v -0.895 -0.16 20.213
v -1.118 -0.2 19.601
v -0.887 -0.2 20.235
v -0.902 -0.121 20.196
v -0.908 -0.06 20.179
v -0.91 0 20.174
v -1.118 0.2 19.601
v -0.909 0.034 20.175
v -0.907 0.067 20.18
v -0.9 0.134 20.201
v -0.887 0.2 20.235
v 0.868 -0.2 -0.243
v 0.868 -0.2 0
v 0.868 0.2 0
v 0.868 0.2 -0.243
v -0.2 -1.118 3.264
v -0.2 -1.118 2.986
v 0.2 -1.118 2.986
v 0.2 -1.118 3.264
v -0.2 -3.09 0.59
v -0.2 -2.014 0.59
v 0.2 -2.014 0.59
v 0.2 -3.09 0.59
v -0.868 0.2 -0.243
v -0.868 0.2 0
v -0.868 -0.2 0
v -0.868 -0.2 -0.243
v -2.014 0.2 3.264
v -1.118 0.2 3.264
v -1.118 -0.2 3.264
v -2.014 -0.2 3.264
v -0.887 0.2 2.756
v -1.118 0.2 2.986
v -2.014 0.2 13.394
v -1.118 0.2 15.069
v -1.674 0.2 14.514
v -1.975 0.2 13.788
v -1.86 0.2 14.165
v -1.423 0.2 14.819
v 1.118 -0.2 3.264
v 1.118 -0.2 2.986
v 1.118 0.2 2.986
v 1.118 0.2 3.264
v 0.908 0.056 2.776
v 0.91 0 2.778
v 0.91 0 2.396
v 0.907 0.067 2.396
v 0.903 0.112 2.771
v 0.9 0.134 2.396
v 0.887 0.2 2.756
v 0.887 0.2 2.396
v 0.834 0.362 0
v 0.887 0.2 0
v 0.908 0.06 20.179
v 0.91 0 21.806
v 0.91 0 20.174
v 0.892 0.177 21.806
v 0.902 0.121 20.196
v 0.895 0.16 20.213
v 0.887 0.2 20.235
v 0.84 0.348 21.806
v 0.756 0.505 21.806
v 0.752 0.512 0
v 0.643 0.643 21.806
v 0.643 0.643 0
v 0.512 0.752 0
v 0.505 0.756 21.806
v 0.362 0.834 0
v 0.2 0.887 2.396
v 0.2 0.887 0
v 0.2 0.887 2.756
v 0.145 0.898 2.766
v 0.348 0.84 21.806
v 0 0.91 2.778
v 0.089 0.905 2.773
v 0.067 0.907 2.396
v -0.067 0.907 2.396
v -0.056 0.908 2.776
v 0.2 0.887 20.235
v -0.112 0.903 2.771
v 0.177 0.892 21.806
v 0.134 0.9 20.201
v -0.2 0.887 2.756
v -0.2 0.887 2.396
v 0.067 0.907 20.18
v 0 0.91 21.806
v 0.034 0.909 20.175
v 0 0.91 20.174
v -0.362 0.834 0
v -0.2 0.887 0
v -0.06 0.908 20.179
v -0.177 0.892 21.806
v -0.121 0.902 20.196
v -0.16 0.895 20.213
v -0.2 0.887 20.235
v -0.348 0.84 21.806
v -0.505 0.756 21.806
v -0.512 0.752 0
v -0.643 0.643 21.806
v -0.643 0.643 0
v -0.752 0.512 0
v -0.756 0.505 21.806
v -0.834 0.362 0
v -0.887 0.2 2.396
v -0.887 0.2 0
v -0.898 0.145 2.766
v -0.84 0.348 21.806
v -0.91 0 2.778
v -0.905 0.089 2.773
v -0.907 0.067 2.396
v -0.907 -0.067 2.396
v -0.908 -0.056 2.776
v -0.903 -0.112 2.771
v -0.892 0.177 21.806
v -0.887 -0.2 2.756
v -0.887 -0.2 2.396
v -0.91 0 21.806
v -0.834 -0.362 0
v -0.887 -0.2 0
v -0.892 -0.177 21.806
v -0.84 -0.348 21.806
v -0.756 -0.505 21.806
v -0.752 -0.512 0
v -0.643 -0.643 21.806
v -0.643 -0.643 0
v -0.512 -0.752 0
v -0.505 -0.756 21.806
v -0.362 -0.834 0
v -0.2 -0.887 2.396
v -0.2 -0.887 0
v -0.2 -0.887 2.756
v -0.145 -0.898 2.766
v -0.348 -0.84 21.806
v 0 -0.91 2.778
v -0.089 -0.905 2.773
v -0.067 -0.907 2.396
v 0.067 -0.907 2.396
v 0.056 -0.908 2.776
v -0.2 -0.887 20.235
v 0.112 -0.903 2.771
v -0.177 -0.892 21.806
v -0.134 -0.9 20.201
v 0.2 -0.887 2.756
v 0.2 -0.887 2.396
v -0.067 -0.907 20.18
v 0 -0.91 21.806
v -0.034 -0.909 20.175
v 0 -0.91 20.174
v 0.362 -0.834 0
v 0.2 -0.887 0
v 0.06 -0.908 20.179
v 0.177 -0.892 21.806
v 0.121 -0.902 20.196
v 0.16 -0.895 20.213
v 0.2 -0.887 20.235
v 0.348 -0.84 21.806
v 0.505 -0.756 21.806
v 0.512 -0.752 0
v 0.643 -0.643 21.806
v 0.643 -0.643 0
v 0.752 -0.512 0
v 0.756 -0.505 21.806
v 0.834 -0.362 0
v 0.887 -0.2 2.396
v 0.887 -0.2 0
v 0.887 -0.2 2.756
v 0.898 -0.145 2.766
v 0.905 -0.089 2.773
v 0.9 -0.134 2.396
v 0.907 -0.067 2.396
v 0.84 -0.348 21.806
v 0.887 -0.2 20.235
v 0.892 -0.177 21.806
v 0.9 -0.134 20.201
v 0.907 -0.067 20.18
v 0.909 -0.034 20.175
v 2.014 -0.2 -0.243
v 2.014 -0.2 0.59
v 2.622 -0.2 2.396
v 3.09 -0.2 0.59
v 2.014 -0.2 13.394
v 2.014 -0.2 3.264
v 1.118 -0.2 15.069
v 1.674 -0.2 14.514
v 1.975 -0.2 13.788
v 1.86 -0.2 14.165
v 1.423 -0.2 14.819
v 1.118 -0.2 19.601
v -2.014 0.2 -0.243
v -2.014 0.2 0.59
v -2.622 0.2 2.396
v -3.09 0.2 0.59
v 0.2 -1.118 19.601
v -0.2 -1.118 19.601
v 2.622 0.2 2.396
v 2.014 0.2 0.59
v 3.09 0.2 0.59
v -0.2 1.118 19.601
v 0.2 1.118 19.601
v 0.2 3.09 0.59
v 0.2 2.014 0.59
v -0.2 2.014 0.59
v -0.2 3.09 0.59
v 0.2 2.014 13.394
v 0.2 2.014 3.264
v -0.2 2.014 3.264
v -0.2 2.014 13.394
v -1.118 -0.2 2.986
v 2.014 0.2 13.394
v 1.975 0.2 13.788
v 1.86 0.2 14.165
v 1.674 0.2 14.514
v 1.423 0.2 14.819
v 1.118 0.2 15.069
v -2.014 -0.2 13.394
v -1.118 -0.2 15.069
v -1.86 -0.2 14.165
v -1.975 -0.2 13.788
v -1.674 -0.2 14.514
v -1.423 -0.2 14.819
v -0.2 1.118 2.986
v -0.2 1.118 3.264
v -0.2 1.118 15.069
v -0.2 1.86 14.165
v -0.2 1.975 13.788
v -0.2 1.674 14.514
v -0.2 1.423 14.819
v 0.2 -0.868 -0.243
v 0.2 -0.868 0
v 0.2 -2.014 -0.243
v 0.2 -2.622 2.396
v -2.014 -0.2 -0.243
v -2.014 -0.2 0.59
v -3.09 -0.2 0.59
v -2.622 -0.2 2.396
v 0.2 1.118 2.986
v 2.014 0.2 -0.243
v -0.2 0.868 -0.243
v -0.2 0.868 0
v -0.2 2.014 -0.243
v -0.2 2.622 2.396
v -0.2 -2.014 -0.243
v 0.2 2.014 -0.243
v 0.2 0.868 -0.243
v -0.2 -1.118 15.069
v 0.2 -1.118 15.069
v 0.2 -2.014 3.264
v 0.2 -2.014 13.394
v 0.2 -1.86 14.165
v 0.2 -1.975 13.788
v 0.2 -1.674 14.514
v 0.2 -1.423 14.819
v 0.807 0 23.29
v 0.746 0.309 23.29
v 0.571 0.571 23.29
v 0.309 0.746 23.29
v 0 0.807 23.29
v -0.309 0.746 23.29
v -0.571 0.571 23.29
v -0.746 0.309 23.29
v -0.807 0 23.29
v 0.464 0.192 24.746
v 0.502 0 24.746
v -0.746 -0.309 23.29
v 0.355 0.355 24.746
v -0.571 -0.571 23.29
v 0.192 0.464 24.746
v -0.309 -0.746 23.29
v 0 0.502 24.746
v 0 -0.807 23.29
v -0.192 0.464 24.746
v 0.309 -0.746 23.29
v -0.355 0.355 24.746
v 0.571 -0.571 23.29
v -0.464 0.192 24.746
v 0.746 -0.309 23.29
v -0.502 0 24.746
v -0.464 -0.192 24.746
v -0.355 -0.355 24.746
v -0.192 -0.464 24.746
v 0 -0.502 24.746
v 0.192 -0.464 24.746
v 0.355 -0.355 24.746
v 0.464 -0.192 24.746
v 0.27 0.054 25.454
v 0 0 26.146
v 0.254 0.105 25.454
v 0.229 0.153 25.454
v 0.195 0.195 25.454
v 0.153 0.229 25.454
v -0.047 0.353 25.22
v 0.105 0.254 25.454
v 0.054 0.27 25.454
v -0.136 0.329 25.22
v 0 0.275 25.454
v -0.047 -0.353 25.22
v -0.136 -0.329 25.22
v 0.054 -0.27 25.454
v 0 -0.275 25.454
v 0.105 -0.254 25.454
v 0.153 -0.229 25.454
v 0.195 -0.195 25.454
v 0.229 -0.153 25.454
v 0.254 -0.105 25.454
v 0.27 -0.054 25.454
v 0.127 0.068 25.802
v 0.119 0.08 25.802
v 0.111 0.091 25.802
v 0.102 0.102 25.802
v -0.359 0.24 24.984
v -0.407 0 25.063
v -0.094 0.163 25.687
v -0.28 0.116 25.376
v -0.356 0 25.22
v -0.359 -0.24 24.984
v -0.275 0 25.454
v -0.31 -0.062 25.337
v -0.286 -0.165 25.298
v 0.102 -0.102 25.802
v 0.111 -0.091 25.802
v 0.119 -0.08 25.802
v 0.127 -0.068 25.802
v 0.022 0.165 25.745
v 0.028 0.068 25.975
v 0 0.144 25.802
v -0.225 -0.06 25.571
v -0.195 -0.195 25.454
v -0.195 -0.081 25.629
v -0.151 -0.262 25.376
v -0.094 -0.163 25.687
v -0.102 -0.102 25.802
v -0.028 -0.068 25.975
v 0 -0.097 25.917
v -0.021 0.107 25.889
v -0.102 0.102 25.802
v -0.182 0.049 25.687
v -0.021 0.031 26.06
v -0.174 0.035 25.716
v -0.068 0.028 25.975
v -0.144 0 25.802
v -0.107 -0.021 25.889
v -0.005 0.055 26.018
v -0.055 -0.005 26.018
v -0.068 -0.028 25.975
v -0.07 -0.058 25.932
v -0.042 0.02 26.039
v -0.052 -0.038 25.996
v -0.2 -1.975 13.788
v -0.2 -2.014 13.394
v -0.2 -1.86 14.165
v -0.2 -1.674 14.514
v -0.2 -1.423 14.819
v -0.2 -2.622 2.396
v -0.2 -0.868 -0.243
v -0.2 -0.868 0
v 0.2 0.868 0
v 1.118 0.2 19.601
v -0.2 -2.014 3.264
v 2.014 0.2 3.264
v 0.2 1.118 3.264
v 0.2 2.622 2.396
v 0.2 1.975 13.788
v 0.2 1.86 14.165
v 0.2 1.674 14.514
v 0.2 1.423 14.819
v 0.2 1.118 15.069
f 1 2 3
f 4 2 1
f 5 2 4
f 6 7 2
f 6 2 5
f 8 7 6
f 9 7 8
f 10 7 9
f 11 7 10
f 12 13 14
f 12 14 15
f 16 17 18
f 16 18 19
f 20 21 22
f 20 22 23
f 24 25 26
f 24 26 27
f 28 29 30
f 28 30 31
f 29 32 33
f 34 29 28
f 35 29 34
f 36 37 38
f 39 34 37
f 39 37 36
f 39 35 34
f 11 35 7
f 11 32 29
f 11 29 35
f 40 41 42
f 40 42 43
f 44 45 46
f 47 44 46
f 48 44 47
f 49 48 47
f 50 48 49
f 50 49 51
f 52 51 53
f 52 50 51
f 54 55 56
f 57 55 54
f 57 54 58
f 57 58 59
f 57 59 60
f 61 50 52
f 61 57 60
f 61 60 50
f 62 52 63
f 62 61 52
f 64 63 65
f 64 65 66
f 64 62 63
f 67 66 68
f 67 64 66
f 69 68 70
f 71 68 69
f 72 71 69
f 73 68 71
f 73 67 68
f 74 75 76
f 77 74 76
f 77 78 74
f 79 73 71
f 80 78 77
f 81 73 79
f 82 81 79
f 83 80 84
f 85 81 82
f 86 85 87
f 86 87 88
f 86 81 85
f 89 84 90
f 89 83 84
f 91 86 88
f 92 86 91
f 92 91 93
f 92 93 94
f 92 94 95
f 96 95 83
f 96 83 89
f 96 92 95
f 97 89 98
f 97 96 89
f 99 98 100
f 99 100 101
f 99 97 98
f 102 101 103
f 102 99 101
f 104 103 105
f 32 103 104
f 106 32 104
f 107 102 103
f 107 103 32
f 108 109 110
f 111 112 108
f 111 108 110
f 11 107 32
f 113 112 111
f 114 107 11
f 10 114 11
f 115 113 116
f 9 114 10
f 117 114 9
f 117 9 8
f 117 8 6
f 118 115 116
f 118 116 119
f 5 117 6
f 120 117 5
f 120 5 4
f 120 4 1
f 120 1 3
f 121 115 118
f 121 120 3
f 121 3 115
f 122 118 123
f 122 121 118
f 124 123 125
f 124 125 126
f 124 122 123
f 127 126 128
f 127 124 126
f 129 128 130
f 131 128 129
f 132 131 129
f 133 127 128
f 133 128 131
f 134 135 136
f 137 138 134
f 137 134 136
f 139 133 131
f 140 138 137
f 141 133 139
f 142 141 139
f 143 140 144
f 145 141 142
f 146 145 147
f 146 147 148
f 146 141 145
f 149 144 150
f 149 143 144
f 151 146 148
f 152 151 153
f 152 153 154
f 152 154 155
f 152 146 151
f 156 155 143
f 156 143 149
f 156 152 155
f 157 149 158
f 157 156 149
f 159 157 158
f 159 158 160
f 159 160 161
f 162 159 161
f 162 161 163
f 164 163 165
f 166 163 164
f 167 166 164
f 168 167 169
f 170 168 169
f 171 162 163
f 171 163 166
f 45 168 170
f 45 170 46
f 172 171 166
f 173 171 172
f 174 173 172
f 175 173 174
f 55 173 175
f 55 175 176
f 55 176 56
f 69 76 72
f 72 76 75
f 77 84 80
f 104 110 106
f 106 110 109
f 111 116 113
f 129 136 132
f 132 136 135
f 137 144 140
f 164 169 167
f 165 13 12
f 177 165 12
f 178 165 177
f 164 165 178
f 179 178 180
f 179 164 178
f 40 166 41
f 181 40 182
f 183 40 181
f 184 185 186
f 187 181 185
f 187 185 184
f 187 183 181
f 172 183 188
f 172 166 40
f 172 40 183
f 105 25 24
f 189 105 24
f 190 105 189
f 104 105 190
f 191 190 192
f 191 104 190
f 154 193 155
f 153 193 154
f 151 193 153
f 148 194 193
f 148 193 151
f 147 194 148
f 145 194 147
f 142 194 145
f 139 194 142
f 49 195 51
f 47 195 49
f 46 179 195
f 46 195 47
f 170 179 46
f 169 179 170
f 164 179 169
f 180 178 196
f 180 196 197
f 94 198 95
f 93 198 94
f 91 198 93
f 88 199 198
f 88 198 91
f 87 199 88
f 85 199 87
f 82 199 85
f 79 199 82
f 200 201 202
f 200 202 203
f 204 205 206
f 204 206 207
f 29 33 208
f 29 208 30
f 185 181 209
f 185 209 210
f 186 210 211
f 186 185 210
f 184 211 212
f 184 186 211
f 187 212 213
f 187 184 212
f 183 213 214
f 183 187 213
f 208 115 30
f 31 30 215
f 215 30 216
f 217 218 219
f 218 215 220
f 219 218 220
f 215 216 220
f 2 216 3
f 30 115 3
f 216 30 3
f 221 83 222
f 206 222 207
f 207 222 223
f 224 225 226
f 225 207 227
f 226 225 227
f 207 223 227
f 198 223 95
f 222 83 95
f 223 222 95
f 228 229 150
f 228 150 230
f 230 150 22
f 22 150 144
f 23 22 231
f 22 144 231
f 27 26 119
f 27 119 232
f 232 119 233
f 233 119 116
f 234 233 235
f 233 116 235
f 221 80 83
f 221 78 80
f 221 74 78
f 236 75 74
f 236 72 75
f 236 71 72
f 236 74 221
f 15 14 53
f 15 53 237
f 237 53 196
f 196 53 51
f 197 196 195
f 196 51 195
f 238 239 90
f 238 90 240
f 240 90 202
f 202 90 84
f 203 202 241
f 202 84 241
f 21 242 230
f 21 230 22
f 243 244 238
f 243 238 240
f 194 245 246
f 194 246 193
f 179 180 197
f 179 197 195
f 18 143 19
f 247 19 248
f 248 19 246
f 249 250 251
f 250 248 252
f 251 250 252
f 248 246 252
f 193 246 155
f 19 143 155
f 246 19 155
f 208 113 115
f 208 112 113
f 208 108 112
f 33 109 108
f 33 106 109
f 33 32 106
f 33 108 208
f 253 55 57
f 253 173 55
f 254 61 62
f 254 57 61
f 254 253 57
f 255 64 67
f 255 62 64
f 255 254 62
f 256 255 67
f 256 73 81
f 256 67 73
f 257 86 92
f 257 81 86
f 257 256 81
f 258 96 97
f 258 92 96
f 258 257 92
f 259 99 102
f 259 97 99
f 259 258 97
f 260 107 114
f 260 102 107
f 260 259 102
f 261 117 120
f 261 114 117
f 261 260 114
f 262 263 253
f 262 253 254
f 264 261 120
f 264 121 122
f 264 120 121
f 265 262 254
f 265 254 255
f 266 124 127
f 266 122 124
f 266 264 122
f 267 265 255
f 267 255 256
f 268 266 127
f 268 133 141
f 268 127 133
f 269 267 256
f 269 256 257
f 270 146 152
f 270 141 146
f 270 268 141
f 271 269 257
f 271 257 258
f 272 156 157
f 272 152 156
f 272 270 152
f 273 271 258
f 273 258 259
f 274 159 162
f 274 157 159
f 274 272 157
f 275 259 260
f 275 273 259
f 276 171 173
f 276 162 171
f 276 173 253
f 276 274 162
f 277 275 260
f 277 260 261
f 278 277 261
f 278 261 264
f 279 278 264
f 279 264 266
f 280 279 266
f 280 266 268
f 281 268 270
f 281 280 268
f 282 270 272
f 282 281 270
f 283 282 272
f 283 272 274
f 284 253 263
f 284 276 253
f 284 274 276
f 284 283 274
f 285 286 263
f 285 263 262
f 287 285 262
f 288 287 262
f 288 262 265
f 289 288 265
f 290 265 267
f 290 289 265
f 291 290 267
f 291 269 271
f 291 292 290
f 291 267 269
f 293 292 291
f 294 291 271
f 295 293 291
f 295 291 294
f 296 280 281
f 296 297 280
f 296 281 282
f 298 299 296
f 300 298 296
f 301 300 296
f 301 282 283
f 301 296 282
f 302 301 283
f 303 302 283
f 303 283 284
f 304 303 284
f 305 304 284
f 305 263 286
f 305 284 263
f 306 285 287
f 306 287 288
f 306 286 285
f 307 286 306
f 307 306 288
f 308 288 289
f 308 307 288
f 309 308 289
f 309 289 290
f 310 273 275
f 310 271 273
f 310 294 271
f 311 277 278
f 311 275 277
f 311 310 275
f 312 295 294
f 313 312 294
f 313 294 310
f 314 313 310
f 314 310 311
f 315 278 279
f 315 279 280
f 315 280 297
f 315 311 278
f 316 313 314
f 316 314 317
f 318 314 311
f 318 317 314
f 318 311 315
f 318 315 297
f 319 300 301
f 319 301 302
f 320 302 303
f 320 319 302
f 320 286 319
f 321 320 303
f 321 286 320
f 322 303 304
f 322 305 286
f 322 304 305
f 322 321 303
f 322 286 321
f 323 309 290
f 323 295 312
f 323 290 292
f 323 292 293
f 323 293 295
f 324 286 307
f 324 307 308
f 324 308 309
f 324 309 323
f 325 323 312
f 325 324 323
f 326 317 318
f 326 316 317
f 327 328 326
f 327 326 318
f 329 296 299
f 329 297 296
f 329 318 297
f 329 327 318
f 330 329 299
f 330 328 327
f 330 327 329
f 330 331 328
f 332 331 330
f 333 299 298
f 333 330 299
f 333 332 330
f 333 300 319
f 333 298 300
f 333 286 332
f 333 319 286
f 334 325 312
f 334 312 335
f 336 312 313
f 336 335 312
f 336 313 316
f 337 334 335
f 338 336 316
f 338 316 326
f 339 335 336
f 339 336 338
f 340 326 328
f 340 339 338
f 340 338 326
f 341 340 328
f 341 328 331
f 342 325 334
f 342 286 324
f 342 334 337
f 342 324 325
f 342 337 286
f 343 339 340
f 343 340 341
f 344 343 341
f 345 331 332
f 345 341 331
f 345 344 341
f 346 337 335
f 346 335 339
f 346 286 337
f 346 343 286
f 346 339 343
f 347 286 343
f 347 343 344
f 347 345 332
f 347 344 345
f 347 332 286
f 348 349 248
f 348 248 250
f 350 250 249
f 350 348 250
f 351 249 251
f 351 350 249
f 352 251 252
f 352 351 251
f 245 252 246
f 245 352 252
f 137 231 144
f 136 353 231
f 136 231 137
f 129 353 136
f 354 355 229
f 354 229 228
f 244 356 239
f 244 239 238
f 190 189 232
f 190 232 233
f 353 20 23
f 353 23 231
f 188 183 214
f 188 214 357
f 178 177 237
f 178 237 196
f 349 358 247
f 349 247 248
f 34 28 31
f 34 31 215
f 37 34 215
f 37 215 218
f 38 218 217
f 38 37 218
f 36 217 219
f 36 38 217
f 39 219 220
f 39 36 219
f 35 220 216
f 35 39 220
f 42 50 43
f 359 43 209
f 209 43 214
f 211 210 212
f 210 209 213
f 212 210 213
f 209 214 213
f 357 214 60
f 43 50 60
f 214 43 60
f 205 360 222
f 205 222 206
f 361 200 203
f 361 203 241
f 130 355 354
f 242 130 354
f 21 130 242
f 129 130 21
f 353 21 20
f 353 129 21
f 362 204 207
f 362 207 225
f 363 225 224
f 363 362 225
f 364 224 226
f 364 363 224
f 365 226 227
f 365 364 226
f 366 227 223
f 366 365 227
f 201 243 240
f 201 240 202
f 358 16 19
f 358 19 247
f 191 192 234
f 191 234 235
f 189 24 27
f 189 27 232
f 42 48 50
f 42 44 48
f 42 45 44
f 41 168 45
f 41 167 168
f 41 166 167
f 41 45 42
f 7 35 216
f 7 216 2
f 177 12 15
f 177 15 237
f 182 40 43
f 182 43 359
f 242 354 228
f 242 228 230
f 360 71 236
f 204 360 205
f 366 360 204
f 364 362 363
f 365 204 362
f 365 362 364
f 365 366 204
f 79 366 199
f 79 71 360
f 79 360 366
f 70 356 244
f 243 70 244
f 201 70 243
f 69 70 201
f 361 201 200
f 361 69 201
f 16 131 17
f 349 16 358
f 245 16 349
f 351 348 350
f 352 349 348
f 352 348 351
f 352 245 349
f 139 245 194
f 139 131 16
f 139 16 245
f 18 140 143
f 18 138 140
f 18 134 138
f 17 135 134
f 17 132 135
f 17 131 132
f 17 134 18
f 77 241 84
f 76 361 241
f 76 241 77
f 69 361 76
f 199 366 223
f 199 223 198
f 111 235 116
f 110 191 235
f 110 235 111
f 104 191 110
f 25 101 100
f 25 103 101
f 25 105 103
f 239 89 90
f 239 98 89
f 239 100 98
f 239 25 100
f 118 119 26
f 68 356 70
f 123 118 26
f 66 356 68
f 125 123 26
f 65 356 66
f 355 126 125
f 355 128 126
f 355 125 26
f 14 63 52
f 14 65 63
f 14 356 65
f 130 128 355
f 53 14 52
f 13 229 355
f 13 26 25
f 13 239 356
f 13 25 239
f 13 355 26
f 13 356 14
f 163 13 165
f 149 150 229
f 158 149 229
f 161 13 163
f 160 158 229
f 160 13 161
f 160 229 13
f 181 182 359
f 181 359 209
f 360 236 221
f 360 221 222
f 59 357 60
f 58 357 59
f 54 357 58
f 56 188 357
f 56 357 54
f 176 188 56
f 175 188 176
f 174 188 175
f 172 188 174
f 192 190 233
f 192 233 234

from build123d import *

# Parameters (mm, degrees)
F2_W     = 0.8680555556
F2_H     = 1.6279645497
F3_DEPTH = 0.2
F4_COUNT = 4


# Not quite as in the source:
# - a feature names something its author has since deleted; it is built from what else it names


with BuildPart() as f1:
    # F0 (on Front) → F1 (revolve)
    with BuildSketch(Plane.XZ):
        with BuildLine():
            Line((0, 26.1458333333), (0, 0))
            Line((0, 0), (0.9097222222, 0))
            Line((0.9097222222, 0), (0.9097222222, 21.8055555556))
            ThreePointArc((0.9097222222, 21.8055555556), (0.6798471947, 24.0228515276), (0, 26.1458333333))
        make_face()
    revolve(axis=Axis((0, 0, 13.0729166667), (0, 0, 1)))

    # F2 (on Front) → F3 (join, symmetric)
    with BuildSketch(Plane.XZ):
        with Locations((0.4340277778, 0.8139822748)):
            Rectangle(F2_W, F2_H)
        with BuildLine():
            Line((0, 22.6730523746), (0, 1.6279645497))
            Line((0, 1.6279645497), (0.8680555556, 1.6279645497))
            Line((0.8680555556, 1.6279645497), (0.8680555556, 0))
            Line((0.8680555556, 0), (0.8680555556, -0.2430555556))
            Line((0.8680555556, -0.2430555556), (2.0138888889, -0.2430555556))
            Line((2.0138888889, -0.2430555556), (2.0138888889, 0.5902777778))
            Line((2.0138888889, 0.5902777778), (3.0902777778, 0.5902777778))
            Line((3.0902777778, 0.5902777778), (2.6215277778, 2.3958333333))
            Line((2.6215277778, 2.3958333333), (0.8, 2.3958333333))
            Line((0.8, 2.3958333333), (0.8, 2.6680555556))
            Line((0.8, 2.6680555556), (1.1180555556, 2.9861111111))
            Line((1.1180555556, 2.9861111111), (1.1180555556, 3.2638888889))
            Line((1.1180555556, 3.2638888889), (2.0138888889, 3.2638888889))
            Line((2.0138888889, 3.2638888889), (2.0138888889, 13.3944219874))
            ThreePointArc((2.0138888889, 13.3944219874), (1.7758643131, 14.3441874312), (1.1180555556, 15.0694444444))
            Line((1.1180555556, 15.0694444444), (1.1180555556, 19.6012199821))
            Line((1.1180555556, 19.6012199821), (0, 22.6730523746))
        make_face()
    extrude(amount=F3_DEPTH, both=True)

    # F4: F1 ×4 about axis
    f4_axis = Axis((0, 0, 0), (0, 0, 1))


with BuildPart() as f1_1:
    add(f1.part)
    for i in range(1, F4_COUNT):
        add(f1.part.rotate(f4_axis, i * 360 / F4_COUNT))


solid = f1_1.part
